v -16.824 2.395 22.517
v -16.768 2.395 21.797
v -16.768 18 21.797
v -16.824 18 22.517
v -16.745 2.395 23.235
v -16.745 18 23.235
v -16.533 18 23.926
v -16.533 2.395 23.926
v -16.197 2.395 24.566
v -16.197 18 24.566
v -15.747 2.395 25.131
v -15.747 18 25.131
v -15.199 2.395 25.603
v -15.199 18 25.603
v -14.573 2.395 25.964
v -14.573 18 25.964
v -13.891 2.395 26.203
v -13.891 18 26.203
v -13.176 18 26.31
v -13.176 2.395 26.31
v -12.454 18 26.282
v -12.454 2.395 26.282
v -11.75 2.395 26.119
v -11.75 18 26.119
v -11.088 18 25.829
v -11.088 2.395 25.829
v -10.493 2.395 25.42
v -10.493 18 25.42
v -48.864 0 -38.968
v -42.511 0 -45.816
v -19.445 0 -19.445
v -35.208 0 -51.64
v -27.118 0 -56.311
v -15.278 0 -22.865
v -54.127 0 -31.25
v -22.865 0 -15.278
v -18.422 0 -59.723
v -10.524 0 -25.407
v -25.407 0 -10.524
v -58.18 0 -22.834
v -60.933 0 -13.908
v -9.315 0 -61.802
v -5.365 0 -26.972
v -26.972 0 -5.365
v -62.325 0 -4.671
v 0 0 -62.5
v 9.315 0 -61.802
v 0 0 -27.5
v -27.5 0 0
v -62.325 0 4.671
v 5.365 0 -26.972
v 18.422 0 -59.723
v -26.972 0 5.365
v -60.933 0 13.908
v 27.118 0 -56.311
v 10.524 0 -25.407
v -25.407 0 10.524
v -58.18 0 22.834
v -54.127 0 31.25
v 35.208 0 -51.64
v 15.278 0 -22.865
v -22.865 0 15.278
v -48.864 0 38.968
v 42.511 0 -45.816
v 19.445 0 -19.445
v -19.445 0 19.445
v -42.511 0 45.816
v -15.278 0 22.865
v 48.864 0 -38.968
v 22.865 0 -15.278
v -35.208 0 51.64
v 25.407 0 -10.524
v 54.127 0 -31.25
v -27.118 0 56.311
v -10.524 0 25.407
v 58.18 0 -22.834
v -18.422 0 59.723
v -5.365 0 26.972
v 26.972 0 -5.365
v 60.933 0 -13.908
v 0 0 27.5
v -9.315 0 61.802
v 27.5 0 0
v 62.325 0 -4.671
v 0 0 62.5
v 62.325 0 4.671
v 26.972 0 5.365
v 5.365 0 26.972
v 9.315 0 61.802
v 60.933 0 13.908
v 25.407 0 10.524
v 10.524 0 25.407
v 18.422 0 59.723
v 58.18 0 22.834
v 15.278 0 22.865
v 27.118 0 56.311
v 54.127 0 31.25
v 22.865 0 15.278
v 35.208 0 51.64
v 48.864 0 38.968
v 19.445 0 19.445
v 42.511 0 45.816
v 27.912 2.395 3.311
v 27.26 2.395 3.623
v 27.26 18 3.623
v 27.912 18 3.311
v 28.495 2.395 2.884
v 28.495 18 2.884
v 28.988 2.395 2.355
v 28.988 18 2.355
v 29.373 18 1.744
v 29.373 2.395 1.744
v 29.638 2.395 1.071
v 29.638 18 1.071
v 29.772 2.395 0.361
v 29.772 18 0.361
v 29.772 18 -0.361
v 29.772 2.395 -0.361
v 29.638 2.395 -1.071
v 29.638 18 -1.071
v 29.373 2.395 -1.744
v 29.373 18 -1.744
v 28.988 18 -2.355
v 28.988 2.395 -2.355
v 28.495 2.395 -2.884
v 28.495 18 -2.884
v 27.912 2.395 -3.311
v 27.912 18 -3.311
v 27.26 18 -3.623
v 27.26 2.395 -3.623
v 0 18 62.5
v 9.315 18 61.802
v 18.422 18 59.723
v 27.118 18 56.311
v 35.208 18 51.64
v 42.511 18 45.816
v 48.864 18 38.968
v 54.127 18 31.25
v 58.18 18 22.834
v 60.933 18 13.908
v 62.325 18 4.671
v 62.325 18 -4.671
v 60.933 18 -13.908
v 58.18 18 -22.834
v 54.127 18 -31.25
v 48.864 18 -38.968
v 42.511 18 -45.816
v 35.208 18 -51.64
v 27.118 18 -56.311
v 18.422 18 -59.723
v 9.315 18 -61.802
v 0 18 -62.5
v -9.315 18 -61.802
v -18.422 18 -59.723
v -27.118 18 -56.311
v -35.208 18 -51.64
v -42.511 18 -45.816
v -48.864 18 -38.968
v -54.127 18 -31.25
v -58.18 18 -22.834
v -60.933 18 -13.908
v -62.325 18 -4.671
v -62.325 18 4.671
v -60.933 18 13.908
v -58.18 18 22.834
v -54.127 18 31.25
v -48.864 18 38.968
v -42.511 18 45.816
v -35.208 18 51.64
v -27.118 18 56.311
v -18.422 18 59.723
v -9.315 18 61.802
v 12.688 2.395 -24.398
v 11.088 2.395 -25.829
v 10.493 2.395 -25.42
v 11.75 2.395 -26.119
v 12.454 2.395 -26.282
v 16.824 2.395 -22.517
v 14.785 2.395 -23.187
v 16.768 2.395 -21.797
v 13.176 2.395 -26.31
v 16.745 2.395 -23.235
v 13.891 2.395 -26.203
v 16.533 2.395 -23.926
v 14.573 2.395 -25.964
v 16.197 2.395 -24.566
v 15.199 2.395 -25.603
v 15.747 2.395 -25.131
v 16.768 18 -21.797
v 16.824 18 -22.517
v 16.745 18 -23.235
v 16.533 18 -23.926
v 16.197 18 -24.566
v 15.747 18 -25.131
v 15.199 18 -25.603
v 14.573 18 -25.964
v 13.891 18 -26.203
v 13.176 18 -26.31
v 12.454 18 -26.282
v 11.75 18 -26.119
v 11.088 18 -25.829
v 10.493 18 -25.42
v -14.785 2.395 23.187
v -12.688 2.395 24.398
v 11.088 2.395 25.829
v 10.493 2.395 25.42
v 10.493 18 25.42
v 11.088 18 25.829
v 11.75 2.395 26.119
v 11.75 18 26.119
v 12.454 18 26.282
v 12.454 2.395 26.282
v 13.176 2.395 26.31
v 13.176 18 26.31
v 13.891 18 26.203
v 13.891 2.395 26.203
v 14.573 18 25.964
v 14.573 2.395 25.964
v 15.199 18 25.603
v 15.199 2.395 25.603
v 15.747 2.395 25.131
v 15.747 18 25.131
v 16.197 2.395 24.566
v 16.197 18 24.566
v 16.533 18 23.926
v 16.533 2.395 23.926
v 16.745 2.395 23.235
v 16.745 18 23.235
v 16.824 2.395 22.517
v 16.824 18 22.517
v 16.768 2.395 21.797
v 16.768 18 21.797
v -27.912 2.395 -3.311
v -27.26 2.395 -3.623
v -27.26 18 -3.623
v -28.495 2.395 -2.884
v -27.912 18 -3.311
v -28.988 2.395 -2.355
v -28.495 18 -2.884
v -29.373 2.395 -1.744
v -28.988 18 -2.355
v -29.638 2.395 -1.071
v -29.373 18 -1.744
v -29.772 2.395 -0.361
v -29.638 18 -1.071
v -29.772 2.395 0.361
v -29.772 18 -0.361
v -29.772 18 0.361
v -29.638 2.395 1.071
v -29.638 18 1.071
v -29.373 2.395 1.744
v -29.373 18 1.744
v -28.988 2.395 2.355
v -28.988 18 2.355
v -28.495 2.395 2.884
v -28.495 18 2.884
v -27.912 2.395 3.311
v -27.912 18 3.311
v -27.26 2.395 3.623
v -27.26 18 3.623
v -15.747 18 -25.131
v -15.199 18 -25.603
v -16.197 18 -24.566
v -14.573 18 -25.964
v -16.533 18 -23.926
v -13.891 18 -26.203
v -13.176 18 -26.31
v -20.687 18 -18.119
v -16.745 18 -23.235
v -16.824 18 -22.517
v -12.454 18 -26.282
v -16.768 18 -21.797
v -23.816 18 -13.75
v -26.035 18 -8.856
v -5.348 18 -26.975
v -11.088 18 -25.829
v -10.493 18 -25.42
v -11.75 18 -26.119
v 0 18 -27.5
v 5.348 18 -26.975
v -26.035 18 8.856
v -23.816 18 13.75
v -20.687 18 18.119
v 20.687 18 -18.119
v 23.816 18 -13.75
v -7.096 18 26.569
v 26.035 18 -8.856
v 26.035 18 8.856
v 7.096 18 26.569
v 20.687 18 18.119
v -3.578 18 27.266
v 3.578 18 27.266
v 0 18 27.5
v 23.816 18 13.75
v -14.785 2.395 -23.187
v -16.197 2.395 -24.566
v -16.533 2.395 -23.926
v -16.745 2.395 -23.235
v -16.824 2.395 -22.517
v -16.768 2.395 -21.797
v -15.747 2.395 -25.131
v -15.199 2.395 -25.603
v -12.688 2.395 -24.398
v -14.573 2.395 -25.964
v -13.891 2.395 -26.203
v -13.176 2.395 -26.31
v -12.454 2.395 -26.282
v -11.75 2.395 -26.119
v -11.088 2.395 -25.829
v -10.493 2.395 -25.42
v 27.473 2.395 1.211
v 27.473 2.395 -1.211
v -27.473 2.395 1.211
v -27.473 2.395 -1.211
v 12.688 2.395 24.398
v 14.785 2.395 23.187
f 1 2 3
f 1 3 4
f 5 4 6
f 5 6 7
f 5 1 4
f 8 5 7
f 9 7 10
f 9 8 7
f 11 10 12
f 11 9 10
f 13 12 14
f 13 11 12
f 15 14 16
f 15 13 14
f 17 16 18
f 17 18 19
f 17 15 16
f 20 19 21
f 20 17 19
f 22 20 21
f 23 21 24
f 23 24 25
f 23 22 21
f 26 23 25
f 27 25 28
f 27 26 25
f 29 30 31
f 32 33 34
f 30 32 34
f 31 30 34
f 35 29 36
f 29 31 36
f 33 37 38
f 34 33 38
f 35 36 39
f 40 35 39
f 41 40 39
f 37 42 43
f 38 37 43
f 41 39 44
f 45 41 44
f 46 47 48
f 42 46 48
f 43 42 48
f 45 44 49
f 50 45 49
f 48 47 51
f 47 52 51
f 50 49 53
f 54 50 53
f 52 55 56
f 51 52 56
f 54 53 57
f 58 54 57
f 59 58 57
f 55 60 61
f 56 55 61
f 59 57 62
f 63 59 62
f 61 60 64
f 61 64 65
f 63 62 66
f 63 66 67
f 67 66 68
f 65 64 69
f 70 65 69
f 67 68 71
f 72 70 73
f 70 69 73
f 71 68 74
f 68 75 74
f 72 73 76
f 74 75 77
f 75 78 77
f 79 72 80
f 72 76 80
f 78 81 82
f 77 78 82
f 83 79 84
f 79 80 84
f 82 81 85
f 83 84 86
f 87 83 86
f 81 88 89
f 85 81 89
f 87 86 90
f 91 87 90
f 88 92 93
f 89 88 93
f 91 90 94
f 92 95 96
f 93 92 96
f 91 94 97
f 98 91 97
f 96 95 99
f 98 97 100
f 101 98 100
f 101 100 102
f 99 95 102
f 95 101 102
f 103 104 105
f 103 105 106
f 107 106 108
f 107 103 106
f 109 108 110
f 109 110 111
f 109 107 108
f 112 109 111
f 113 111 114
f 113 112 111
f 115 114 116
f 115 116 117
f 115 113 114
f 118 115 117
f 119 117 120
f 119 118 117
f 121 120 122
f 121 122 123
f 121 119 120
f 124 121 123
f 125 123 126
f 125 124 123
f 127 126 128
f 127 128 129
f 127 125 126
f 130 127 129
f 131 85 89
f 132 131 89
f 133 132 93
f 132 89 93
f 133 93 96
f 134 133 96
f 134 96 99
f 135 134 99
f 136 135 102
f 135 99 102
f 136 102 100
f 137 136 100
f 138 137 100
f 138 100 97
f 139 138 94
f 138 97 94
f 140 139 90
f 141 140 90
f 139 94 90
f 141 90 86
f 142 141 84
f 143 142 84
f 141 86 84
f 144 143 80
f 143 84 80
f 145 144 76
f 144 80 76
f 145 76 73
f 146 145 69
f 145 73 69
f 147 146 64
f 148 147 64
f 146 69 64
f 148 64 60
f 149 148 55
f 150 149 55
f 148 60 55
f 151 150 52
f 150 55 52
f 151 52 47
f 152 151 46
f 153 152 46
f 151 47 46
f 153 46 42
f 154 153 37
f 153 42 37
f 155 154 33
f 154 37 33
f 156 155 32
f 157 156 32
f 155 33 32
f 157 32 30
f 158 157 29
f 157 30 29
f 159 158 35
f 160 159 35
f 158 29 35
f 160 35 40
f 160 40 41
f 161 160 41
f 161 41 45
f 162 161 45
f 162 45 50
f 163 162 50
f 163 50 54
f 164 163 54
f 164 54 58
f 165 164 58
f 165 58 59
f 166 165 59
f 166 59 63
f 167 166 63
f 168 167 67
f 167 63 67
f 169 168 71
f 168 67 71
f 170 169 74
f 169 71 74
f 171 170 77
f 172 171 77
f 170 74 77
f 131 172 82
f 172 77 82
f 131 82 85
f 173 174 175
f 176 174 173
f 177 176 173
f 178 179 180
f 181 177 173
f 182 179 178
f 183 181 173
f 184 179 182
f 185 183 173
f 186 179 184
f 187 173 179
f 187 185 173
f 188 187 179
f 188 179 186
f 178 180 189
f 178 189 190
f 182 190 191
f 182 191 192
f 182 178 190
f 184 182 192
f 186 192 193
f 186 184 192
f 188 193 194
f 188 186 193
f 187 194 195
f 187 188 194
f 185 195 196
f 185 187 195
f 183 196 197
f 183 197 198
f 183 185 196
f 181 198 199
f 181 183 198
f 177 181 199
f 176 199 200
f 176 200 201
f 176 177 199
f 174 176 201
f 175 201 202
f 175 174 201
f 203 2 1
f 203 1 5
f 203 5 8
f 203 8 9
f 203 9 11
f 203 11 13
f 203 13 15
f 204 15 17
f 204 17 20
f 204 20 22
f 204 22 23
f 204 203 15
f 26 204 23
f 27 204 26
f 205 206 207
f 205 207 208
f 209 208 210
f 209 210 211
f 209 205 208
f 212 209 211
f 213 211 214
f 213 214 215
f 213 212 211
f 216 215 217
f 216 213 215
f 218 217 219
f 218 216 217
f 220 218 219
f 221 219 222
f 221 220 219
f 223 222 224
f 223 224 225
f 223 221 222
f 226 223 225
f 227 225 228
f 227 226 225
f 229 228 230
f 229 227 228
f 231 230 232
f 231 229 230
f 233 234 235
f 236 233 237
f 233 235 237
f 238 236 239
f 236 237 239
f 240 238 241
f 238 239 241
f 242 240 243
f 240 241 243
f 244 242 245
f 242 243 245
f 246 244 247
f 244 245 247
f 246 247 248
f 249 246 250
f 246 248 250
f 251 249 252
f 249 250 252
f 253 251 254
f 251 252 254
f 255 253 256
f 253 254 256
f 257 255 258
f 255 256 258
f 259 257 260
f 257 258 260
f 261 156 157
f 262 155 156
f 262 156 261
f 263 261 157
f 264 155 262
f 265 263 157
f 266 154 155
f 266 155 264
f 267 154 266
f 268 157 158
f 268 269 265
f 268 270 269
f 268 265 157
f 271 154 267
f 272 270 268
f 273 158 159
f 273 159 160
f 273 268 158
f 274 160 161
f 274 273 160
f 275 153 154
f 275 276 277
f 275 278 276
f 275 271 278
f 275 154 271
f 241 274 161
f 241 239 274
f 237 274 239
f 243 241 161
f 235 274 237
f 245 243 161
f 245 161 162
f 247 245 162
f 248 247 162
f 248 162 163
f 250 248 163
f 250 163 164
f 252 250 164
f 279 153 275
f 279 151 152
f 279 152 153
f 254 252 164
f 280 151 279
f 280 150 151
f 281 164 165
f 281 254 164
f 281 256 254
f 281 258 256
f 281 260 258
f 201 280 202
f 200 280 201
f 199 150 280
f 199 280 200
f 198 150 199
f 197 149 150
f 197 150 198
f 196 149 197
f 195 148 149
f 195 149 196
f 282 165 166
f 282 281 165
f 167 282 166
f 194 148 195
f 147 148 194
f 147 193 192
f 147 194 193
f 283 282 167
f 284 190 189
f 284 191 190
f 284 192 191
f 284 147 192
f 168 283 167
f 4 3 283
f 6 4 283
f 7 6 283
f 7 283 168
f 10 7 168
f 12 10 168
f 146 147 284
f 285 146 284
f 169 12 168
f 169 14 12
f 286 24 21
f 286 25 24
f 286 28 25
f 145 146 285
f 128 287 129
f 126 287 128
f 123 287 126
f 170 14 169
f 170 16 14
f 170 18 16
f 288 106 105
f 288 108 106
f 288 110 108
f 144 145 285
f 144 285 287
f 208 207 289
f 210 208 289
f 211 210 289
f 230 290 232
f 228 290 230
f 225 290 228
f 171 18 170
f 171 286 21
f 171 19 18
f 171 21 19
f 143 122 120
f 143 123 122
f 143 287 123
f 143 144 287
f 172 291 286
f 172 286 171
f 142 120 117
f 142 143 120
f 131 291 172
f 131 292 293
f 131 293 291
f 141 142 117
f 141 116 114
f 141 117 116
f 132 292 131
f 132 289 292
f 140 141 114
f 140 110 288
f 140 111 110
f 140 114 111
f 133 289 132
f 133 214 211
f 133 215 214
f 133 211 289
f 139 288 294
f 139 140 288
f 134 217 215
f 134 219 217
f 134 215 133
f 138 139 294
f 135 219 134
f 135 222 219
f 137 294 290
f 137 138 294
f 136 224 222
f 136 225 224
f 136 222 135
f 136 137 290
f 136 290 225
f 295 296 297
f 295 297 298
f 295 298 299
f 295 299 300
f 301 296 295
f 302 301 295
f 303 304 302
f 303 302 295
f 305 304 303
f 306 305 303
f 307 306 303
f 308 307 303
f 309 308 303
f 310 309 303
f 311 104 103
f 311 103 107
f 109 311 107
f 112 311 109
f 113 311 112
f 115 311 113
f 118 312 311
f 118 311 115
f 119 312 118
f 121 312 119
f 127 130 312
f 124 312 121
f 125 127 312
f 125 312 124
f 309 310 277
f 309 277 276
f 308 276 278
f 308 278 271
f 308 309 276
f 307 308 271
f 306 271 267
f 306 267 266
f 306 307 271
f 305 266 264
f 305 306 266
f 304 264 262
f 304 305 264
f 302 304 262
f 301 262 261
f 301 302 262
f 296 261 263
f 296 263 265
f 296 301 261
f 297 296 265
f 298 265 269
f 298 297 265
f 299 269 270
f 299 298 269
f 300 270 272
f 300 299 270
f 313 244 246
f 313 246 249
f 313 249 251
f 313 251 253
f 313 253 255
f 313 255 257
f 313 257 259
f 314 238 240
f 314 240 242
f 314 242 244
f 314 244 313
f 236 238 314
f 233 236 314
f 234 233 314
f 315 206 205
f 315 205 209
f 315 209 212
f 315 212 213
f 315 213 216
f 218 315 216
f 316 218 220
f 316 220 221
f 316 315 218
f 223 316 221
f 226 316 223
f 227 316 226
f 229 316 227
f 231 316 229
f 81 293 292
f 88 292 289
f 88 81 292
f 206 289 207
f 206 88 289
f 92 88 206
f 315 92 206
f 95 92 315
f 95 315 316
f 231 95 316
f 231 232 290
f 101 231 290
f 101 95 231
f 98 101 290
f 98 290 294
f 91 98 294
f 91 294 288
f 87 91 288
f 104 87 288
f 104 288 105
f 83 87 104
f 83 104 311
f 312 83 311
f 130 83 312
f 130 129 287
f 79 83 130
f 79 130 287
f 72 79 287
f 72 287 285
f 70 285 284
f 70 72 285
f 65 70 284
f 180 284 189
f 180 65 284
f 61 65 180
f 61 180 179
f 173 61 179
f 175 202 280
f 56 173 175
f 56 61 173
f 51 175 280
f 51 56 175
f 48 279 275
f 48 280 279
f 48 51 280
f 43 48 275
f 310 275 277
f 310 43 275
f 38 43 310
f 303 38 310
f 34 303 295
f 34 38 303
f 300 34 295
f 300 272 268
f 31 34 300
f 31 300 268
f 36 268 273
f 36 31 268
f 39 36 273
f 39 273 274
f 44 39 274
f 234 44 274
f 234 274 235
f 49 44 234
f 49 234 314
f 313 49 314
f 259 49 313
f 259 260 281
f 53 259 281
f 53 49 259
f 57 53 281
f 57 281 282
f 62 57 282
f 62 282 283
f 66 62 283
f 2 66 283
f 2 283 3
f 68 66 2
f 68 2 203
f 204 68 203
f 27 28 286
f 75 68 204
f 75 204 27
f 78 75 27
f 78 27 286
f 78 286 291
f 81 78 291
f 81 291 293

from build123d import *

# Parameters (mm, degrees)
SKETCH1_R           = 62.5
BOSS_EXTRUDE1_DEPTH = 18
SKETCH2_R           = 27.5
CUT_EXTRUDE1_DEPTH  = 91.202549853
SKETCH3_R           = 3.859440813
CUT_EXTRUDE2_DEPTH  = 15.605006108
CIRPATTERN1_COUNT   = 6


with BuildPart() as part:
    # Sketch1 → Boss-Extrude1 (new body)
    with BuildSketch(Plane(origin=(0, 0, 0), x_dir=(1, 0, 0), z_dir=(0, 1, 0))):
        Circle(SKETCH1_R)
    extrude(amount=BOSS_EXTRUDE1_DEPTH)

    # Sketch2 → Cut-Extrude1 (cut, through all)
    with BuildSketch(Plane(origin=(0, 0, 0), x_dir=(1, 0, 0), z_dir=(0, 1, 0))):
        Circle(SKETCH2_R)
    extrude(amount=CUT_EXTRUDE1_DEPTH, mode=Mode.SUBTRACT)

    # Sketch3 → Cut-Extrude2 (cut)
    with BuildSketch(Plane(origin=(0, 18, 0), x_dir=(1, 0, 0), z_dir=(0, 1, 0))):
        with Locations((-25.929979996, 0)):
            Circle(SKETCH3_R)
    cut_extrude2 = extrude(amount=-CUT_EXTRUDE2_DEPTH, mode=Mode.SUBTRACT)

    # CirPattern1: Cut-Extrude2 ×6 about axis
    cirpattern1_axis = Axis((0, 0, 0), (0, 1, 0))
    for i in range(1, CIRPATTERN1_COUNT):
        add(cut_extrude2.rotate(cirpattern1_axis, i * 360 / CIRPATTERN1_COUNT), mode=Mode.SUBTRACT)


solid = part.part
